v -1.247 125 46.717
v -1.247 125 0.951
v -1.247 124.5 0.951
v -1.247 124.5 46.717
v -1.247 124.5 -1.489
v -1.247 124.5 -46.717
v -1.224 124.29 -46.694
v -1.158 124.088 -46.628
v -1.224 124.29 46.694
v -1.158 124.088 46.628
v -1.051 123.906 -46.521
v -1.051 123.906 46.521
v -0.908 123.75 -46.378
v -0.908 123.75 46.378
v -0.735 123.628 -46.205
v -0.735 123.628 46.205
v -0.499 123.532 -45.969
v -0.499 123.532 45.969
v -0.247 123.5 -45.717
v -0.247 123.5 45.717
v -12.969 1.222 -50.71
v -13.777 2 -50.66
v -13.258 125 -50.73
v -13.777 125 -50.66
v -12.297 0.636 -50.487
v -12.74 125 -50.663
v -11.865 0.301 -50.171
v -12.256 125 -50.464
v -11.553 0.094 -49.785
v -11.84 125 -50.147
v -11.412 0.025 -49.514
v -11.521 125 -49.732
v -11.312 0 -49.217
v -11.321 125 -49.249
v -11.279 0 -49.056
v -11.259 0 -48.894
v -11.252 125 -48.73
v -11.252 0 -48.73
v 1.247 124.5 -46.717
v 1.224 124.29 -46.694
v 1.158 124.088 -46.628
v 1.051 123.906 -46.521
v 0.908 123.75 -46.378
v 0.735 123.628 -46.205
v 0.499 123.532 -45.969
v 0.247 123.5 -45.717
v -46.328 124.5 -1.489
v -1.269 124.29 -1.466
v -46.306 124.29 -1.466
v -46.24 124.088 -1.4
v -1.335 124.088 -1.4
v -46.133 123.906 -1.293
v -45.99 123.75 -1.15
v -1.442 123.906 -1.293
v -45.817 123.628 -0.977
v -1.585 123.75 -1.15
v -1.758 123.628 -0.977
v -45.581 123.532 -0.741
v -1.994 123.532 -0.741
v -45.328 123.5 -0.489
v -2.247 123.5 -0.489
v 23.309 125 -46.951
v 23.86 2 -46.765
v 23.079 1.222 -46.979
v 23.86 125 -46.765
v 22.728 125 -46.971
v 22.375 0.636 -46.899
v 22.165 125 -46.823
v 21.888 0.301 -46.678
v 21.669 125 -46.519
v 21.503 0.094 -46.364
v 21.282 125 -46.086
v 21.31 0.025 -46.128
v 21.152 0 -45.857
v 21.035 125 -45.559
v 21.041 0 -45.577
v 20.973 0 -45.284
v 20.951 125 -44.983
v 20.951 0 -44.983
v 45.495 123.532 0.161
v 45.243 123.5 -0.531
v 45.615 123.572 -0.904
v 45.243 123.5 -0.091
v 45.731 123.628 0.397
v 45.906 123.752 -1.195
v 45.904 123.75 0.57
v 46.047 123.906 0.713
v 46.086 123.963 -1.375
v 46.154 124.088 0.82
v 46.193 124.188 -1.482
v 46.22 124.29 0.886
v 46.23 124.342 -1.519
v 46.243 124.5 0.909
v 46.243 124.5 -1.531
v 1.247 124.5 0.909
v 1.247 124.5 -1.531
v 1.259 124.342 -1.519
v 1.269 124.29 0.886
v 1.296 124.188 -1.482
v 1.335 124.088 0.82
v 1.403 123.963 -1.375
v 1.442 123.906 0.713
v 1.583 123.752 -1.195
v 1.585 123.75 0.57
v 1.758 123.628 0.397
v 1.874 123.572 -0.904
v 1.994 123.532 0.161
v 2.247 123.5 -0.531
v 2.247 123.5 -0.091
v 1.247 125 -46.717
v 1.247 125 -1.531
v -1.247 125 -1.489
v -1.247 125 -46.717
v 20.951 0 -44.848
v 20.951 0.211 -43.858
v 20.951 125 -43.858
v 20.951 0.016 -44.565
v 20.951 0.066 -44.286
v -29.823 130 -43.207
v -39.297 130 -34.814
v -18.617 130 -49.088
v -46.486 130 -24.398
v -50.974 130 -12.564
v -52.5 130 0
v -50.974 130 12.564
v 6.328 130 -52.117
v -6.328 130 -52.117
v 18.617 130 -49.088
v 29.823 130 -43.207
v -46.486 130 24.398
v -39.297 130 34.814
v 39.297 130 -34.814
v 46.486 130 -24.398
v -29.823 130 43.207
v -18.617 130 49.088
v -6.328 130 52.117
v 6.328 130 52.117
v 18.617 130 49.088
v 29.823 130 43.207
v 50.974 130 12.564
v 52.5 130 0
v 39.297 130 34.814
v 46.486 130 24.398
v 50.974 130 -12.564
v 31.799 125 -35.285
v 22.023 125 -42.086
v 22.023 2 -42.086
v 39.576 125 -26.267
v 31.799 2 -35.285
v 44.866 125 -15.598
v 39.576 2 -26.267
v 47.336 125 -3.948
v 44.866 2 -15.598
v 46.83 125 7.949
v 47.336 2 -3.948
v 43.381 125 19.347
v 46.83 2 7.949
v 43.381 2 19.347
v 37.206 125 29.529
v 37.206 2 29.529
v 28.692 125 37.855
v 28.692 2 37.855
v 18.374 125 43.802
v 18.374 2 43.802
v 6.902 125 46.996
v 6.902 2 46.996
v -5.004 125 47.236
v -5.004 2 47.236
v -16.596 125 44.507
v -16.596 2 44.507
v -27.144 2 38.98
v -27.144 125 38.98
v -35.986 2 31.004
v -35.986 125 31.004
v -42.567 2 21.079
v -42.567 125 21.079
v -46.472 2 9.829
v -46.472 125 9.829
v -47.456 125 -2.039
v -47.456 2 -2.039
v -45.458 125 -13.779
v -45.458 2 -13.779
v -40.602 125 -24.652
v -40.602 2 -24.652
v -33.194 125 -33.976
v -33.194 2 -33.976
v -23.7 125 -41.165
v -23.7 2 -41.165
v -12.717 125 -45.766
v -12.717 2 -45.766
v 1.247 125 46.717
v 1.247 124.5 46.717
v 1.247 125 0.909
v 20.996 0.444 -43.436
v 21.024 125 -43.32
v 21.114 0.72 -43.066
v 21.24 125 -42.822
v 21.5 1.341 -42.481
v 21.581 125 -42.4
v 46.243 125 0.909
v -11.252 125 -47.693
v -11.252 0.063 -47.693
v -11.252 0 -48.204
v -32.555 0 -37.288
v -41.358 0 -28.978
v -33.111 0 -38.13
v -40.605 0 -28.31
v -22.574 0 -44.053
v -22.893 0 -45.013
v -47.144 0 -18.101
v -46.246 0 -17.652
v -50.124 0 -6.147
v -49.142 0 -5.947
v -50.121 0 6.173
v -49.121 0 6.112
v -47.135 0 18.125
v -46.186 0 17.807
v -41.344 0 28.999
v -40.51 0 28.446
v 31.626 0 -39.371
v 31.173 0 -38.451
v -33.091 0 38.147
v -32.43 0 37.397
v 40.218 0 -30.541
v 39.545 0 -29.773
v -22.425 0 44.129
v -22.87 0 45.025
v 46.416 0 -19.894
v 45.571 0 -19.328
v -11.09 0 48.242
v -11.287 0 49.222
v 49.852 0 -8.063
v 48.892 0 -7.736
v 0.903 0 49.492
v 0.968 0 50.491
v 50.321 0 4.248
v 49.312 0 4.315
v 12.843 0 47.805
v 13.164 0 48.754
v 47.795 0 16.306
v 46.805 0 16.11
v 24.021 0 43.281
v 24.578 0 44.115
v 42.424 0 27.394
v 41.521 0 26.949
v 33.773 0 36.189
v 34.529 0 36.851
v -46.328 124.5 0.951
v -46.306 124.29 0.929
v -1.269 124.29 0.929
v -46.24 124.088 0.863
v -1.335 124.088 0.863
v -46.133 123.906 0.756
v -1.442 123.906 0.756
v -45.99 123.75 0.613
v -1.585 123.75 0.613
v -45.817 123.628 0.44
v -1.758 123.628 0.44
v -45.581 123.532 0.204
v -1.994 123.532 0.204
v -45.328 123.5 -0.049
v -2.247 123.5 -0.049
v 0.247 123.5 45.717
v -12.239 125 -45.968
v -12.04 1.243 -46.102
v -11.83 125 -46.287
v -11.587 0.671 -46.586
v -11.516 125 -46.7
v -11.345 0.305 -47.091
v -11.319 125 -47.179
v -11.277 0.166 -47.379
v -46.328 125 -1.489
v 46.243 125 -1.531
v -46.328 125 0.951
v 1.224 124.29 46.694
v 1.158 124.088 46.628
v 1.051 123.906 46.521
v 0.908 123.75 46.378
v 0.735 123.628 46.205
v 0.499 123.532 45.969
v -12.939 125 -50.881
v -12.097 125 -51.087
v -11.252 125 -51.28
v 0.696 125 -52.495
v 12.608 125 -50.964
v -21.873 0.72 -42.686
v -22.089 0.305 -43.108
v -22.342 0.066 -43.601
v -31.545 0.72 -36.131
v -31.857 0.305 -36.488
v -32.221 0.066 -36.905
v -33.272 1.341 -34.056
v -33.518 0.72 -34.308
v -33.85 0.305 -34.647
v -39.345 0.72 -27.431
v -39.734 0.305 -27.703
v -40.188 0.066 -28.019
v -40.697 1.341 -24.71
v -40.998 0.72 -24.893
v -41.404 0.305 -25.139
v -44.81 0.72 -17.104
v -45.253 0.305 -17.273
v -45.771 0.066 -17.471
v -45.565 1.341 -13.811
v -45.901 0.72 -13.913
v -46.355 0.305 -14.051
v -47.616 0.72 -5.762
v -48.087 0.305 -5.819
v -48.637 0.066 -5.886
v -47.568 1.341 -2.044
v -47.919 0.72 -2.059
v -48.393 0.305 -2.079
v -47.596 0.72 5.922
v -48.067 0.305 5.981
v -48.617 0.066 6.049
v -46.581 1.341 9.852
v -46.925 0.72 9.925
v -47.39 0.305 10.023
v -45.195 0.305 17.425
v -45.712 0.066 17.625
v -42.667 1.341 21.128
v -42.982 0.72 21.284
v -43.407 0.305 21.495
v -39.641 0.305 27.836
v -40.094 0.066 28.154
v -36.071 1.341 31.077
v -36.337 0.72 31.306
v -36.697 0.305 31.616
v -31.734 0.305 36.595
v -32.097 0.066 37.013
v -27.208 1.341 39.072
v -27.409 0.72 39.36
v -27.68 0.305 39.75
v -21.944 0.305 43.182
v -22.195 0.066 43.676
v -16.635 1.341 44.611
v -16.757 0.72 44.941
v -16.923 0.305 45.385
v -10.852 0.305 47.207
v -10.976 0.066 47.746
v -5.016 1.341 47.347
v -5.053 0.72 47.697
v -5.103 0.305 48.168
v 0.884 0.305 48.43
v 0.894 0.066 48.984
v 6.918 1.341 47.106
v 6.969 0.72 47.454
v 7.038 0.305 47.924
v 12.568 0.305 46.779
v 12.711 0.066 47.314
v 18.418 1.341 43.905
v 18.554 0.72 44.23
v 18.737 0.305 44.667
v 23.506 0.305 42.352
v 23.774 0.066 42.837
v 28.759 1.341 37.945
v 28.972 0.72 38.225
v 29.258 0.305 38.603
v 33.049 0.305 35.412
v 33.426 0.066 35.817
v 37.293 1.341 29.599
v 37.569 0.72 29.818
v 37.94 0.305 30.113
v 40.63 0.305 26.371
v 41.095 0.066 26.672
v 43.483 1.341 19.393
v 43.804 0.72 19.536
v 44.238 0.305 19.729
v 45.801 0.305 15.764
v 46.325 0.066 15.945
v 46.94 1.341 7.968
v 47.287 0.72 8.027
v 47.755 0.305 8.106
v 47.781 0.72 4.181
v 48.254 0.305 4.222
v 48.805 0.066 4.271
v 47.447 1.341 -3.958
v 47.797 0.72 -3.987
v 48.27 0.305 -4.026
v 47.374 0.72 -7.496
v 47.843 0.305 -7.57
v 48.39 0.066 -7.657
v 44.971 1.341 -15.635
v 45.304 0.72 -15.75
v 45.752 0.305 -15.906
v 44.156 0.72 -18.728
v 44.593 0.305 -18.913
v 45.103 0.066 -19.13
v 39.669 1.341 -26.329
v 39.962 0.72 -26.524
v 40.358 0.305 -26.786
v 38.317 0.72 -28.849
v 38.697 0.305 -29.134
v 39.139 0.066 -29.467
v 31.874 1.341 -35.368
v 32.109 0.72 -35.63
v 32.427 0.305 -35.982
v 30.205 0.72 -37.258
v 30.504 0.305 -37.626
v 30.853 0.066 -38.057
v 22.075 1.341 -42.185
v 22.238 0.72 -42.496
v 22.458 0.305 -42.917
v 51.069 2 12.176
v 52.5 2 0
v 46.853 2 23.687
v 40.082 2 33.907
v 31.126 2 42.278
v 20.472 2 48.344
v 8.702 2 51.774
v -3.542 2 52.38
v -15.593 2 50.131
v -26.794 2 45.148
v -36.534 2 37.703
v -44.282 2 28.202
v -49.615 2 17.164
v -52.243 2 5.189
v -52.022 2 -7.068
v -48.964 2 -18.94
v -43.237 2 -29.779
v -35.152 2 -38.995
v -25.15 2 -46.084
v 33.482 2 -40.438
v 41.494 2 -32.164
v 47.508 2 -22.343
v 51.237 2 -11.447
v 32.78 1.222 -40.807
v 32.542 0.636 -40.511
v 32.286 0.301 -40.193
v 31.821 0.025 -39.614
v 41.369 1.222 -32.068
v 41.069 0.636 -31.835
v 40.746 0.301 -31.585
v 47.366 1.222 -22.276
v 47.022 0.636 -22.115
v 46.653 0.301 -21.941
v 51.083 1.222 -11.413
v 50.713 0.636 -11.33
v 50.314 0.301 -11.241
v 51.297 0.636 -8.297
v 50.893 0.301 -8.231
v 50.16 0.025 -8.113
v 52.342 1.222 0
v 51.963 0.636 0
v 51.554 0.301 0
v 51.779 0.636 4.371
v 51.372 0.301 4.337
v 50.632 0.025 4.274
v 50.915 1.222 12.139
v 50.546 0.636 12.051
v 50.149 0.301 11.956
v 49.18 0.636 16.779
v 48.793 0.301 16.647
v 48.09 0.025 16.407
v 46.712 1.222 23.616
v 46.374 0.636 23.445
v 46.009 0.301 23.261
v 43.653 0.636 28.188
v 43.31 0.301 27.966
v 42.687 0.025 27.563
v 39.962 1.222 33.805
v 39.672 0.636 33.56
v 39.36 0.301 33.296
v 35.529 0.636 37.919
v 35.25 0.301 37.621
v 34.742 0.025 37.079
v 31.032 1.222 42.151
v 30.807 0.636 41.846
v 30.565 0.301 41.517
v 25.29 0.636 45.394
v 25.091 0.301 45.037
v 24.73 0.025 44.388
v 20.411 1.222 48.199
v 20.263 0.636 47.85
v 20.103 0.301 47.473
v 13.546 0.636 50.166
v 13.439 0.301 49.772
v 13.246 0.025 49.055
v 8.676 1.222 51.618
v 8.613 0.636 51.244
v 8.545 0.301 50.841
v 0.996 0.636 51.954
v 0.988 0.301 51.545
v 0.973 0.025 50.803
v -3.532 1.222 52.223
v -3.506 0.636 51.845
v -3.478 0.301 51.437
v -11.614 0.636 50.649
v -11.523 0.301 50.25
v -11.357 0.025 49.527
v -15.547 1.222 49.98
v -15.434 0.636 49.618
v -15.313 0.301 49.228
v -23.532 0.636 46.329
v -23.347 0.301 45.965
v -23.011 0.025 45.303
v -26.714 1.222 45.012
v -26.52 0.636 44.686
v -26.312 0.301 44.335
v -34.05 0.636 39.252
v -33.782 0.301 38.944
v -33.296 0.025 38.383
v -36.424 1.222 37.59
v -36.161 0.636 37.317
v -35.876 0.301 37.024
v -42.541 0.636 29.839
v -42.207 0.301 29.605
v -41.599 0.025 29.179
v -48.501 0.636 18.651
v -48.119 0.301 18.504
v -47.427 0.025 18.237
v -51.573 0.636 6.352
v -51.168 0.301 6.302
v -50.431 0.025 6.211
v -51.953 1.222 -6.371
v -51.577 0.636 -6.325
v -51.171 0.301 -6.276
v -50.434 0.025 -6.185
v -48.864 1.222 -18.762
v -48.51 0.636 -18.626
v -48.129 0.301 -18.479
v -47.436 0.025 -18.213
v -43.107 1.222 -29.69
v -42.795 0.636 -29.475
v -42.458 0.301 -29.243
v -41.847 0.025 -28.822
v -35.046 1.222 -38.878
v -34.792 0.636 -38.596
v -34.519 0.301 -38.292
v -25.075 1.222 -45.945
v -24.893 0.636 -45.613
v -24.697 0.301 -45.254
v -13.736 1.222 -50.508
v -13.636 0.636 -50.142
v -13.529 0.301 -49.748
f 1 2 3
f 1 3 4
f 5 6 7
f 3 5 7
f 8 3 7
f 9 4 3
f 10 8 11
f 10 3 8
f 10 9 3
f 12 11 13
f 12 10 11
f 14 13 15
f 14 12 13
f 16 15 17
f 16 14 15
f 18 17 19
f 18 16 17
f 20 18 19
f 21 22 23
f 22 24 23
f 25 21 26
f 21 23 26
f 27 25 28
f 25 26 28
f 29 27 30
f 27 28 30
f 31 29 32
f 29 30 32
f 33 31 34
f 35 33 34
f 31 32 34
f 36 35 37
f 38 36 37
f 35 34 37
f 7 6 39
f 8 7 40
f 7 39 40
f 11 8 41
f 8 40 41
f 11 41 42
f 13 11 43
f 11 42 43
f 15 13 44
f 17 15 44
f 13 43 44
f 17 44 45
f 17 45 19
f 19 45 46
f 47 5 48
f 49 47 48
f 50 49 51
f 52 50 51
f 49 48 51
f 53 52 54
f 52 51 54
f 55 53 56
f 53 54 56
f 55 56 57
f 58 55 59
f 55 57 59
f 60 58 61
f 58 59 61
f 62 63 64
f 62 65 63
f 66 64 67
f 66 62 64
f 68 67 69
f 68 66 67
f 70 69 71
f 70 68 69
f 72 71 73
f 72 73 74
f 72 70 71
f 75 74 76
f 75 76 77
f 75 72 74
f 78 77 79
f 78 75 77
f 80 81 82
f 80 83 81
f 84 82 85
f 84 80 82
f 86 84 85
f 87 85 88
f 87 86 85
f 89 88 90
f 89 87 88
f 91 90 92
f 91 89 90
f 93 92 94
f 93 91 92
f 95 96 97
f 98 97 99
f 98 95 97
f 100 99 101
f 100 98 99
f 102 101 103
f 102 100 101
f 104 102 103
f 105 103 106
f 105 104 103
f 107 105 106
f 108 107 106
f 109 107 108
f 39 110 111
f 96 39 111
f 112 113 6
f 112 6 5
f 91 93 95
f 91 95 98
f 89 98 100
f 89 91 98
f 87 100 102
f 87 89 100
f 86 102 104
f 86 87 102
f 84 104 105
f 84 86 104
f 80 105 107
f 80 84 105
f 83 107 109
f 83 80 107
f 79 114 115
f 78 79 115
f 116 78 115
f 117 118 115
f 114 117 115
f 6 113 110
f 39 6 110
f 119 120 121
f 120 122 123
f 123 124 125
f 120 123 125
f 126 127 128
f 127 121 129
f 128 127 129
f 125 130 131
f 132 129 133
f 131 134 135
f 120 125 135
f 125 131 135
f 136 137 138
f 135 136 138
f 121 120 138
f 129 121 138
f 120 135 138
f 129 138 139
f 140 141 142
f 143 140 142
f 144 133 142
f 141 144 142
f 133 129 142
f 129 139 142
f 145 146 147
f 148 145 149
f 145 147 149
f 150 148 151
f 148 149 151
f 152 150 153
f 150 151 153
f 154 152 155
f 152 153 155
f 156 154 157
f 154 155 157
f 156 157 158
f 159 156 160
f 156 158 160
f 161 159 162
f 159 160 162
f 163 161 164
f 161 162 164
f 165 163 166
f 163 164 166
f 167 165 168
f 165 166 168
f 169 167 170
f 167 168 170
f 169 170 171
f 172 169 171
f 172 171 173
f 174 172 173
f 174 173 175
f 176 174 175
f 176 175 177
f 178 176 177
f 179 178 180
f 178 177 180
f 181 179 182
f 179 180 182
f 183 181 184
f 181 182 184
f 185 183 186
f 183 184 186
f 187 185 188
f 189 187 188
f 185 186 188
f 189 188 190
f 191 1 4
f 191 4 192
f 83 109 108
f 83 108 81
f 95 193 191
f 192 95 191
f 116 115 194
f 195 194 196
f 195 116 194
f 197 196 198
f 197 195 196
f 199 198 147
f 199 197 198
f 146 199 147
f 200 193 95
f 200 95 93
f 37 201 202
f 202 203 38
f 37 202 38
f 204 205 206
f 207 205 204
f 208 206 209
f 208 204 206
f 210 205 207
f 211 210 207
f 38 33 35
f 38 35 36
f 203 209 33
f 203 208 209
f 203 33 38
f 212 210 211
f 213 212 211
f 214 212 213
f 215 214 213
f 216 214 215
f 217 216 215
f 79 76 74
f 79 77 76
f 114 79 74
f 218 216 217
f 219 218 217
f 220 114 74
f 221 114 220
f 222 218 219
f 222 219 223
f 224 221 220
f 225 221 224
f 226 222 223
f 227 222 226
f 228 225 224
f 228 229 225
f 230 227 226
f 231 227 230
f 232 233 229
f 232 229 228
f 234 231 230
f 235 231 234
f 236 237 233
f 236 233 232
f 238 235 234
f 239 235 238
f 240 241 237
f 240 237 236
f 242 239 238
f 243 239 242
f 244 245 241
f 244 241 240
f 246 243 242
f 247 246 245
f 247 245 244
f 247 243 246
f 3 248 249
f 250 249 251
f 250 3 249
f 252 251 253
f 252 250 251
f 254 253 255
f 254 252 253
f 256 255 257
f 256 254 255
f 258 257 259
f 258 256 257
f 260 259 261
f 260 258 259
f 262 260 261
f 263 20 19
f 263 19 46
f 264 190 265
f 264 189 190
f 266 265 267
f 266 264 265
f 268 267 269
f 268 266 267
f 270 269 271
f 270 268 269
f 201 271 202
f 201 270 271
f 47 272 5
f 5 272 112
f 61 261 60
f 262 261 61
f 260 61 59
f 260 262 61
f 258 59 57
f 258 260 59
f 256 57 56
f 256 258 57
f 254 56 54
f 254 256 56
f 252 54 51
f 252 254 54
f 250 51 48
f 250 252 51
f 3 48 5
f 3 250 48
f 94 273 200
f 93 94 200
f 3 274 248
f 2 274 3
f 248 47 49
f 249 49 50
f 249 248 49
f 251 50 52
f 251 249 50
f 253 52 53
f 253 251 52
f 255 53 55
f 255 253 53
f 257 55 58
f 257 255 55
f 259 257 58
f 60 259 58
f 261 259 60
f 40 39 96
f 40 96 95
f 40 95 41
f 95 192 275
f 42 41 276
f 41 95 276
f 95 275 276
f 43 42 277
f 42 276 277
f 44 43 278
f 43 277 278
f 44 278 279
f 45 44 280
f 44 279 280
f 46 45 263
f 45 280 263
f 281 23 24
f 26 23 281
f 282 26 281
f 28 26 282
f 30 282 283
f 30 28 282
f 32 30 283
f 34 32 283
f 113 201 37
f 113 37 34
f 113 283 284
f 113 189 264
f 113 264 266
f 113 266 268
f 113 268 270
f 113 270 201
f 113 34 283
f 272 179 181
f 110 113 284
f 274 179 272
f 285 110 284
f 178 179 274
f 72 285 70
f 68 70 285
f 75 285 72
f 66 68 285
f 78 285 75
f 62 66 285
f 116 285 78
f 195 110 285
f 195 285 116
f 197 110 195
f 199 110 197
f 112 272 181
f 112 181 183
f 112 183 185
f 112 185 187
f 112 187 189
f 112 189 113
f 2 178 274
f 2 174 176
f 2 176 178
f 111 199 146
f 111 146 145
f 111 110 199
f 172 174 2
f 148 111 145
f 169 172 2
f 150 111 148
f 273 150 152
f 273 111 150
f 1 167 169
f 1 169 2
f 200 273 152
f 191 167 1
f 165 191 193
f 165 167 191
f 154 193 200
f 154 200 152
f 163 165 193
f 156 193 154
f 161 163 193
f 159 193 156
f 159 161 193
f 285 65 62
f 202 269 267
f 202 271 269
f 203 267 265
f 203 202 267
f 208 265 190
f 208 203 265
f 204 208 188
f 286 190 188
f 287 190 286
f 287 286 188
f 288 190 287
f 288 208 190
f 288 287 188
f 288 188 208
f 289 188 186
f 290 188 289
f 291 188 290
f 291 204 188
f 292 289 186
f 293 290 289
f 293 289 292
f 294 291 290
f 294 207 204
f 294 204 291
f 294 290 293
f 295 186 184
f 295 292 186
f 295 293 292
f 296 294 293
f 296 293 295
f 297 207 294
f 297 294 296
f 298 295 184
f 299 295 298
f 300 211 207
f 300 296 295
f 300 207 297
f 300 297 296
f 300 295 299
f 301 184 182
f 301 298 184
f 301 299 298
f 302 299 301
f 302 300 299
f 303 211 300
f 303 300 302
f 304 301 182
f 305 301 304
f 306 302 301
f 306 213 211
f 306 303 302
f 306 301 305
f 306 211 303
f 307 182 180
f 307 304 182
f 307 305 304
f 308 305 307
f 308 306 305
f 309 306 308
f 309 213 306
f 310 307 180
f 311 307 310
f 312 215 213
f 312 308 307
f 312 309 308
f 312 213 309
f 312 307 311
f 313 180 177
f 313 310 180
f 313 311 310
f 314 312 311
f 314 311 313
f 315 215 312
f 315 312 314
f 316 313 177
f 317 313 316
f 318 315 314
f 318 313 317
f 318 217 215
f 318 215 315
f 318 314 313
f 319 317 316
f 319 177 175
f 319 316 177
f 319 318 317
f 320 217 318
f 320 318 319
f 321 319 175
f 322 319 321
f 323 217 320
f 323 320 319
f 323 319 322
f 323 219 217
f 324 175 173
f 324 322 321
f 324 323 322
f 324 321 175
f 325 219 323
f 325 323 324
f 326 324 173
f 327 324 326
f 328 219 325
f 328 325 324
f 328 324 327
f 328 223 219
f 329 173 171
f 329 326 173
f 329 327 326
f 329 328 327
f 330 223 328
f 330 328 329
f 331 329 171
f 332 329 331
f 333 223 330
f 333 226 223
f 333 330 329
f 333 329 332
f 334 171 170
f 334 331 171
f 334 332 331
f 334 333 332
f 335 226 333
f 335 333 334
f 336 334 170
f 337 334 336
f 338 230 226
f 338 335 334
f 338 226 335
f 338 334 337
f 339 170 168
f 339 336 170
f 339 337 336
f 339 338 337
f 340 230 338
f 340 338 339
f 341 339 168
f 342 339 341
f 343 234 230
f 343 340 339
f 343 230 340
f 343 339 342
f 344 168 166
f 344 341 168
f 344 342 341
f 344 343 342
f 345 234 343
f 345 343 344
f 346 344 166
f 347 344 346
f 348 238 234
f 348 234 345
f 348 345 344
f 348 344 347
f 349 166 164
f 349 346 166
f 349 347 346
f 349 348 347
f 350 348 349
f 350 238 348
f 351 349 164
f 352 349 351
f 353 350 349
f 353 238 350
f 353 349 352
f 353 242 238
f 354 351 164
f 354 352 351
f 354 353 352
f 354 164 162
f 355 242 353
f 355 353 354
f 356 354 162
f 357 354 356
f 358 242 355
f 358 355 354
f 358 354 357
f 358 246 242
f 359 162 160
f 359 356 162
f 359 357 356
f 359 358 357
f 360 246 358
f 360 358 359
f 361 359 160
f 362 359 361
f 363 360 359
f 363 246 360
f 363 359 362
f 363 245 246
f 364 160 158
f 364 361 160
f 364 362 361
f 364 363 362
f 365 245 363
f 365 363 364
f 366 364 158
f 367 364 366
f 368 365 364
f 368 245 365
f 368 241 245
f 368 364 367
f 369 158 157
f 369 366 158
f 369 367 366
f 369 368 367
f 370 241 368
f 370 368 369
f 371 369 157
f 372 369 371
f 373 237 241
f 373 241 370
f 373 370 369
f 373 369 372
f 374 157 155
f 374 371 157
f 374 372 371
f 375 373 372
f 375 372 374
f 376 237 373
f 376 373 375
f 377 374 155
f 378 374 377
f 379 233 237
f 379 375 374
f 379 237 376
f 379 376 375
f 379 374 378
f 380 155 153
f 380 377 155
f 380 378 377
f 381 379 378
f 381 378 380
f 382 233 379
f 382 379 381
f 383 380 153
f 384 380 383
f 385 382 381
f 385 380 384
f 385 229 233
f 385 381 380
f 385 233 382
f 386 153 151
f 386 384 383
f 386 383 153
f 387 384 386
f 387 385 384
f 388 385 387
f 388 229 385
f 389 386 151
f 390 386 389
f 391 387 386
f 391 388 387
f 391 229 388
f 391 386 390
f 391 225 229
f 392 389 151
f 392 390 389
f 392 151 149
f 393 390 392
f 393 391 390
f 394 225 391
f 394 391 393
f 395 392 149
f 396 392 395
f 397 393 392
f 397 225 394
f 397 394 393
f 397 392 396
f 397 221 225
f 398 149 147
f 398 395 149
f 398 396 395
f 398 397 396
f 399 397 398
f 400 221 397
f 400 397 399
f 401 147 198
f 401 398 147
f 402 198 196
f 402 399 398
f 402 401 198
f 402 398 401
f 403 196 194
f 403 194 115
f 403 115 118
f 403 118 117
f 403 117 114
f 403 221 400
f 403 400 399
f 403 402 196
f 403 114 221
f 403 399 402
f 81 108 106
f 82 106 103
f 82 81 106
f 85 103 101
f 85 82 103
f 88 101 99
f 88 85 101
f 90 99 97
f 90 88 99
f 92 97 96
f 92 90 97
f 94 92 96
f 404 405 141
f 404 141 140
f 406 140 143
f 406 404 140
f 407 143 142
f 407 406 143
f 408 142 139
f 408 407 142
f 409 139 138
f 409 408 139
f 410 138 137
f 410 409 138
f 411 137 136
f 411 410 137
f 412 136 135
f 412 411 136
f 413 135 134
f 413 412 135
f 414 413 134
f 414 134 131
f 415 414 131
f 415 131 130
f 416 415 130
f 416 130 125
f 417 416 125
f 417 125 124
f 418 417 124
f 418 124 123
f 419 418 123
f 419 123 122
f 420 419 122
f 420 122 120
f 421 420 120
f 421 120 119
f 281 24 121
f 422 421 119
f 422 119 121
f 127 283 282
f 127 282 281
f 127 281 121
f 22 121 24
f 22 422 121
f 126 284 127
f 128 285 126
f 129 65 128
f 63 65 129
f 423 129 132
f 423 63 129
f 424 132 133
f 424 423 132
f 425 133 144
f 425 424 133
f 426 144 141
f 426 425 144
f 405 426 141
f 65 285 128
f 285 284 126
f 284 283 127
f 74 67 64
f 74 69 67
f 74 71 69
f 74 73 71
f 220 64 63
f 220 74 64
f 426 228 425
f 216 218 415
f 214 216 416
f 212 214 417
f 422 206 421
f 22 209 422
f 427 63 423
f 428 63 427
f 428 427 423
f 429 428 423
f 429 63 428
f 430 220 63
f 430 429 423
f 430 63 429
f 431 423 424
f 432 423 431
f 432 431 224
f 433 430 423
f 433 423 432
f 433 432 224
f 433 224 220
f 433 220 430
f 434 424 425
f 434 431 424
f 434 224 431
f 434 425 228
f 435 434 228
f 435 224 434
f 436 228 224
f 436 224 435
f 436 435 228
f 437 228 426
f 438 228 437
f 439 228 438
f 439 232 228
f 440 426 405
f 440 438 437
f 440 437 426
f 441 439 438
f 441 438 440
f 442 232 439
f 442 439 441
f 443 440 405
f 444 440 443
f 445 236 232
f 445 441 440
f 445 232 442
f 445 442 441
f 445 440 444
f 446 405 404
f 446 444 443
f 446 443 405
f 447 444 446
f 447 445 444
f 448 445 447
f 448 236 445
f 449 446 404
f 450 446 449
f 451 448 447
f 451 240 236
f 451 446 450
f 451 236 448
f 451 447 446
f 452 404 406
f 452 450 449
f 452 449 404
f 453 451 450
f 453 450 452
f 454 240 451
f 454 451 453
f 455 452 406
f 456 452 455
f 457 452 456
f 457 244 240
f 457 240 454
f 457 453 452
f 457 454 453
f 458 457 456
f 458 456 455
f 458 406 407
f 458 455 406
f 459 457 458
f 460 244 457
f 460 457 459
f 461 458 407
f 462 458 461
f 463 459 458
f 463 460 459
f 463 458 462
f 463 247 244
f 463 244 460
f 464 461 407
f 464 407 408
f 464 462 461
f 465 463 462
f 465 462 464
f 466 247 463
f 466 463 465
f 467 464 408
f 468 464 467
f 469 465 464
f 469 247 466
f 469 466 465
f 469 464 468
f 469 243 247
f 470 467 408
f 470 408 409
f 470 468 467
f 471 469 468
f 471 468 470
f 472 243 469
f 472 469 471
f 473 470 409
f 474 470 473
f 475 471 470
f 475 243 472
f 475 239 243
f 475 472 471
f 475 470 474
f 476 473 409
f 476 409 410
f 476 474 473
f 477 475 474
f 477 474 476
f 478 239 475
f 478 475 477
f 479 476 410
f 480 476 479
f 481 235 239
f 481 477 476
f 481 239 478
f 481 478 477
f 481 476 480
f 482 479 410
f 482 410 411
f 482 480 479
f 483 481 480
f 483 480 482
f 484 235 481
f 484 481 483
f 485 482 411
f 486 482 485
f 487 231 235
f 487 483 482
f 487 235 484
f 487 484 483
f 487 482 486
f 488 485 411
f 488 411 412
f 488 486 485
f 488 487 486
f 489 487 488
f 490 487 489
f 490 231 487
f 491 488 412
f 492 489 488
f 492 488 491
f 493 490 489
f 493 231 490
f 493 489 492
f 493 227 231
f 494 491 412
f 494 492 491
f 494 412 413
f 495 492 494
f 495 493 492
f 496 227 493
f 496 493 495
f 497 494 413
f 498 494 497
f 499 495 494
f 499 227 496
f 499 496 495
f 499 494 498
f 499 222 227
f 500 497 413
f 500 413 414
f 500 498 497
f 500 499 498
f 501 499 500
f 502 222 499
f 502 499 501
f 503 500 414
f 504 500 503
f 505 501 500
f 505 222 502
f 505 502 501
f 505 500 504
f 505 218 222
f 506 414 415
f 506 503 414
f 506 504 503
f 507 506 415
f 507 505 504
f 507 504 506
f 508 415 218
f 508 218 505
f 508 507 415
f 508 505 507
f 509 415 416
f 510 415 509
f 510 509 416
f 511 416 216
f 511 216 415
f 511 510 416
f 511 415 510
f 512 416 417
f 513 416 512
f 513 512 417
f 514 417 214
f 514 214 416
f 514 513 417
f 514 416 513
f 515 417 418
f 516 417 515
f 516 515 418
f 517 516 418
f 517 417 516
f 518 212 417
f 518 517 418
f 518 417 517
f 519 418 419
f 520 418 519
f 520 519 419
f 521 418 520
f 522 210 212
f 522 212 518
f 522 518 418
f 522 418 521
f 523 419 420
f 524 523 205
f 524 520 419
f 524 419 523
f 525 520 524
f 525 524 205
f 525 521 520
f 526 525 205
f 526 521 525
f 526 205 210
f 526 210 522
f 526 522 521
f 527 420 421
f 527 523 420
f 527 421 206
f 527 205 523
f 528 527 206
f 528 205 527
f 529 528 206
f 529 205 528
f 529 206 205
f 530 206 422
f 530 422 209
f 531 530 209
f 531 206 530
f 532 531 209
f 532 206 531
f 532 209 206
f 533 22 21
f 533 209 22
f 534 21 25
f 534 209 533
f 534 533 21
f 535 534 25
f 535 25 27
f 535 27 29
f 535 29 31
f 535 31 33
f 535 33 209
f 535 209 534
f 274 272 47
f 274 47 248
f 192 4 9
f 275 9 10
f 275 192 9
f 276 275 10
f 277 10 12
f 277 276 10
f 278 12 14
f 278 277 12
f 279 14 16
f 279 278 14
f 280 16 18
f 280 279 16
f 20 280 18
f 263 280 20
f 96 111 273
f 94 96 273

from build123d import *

# Parameters (mm, degrees)
F0_R      = 52.5
F1_DEPTH  = 130
F2_R      = 47.5
F3_DEPTH  = 125
F5_DEPTH  = 125
F6_R      = 2
F7_W      = 2.493188018
F7_H      = 93.4330150485
F8_DEPTH  = 1.5
F9_R      = 1
F10_W     = 45.0817196397
F10_H     = 2.4400168913
F11_DEPTH = 1.5
F12_R     = 0.99999
F13_W     = 44.996257755
F13_H     = 2.44
F14_DEPTH = 1.5
F15_R     = 0.99999


# Not quite as in the source:
# - a fillet or chamfer is up to 0.001 mm smaller than in the source, because OpenCascade refuses the exact size


with BuildPart() as f1:
    # F0 (on Front) → F1 (new body)
    with BuildSketch(Plane.XZ):
        Circle(F0_R)
    extrude(amount=-F1_DEPTH)

    # F2 (on face) → F3 (cut)
    with BuildSketch(Plane.XZ):
        Circle(F2_R)
    extrude(amount=-F3_DEPTH, mode=Mode.SUBTRACT)

    # F4 (on face) → F5 (cut)
    with BuildSketch(Plane.XZ):
        with BuildLine():
            ThreePointArc((20.9507066756, -42.6300116091), (5.1584797983, -47.2190648591), (-11.2520875409, -46.1480284083))
            Line((-11.2520875409, -46.1480284083), (-11.2520875409, -51.280020729))
            ThreePointArc((-11.2520875409, -51.280020729), (5.0973568866, -52.2519564492), (20.9507066756, -48.1385281224))
            Line((20.9507066756, -48.1385281224), (20.9507066756, -42.6300116091))
        make_face()
    extrude(amount=-F5_DEPTH, mode=Mode.SUBTRACT)

    # F6
    f6_edges = [f1.edges().sort_by_distance(p)[0] for p in [
        (-32.905284, 0, 40.90834),
        (-5.15848, 0, 47.219065),
        (-11.252088, 62.5, -46.148028),
        (20.950707, 62.5, -42.630012),
        (-11.252088, 62.5, -51.280021),
        (20.950707, 62.5, -48.138528),
    ]]
    fillet(f6_edges, radius=F6_R)

    # F7 (on face) → F8 (join)
    with BuildSketch(Plane.XZ.offset(-125)):
        Rectangle(F7_W, F7_H)
    extrude(amount=F8_DEPTH)

    # F9
    f9_edges = [f1.edges().sort_by_distance(p)[0] for p in [
        (-1.246594, 123.5, 0),
        (1.246594, 123.5, 0),
        (0, 123.5, 46.716508),
        (0, 123.5, -46.716508),
    ]]
    fillet(f9_edges, radius=F9_R)

    # F10 (on face) → F11 (join)
    with BuildSketch(Plane.XZ.offset(-125)):
        with Locations((-23.7874538288, -0.268576463)):
            Rectangle(F10_W, F10_H)
    extrude(amount=F11_DEPTH)

    # F12 (radius 1 in the source; OpenCascade refuses exactly that, so slightly less here)
    f12_edges = [f1.edges().sort_by_distance(p)[0] for p in [
        (-23.787454, 123.5, -1.488585),
        (-23.787454, 123.5, 0.951432),
        (-46.328314, 123.5, -0.268576),
        (-1.246594, 123.5, -0.268576),
    ]]
    fillet(f12_edges, radius=F12_R)

    # F13 (on face) → F14 (join)
    with BuildSketch(Plane.XZ.offset(-125)):
        with Locations((23.7447228865, -0.311423186)):
            Rectangle(F13_W, F13_H)
    extrude(amount=F14_DEPTH)

    # F15 (radius 1 in the source; OpenCascade refuses exactly that, so slightly less here)
    f15_edges = [f1.edges().sort_by_distance(p)[0] for p in [
        (23.744723, 123.5, 0.908577),
        (23.744723, 123.5, -1.531423),
        (1.246594, 123.5, -0.311423),
        (46.242852, 123.5, -0.311423),
    ]]
    fillet(f15_edges, radius=F15_R)


solid = f1.part
